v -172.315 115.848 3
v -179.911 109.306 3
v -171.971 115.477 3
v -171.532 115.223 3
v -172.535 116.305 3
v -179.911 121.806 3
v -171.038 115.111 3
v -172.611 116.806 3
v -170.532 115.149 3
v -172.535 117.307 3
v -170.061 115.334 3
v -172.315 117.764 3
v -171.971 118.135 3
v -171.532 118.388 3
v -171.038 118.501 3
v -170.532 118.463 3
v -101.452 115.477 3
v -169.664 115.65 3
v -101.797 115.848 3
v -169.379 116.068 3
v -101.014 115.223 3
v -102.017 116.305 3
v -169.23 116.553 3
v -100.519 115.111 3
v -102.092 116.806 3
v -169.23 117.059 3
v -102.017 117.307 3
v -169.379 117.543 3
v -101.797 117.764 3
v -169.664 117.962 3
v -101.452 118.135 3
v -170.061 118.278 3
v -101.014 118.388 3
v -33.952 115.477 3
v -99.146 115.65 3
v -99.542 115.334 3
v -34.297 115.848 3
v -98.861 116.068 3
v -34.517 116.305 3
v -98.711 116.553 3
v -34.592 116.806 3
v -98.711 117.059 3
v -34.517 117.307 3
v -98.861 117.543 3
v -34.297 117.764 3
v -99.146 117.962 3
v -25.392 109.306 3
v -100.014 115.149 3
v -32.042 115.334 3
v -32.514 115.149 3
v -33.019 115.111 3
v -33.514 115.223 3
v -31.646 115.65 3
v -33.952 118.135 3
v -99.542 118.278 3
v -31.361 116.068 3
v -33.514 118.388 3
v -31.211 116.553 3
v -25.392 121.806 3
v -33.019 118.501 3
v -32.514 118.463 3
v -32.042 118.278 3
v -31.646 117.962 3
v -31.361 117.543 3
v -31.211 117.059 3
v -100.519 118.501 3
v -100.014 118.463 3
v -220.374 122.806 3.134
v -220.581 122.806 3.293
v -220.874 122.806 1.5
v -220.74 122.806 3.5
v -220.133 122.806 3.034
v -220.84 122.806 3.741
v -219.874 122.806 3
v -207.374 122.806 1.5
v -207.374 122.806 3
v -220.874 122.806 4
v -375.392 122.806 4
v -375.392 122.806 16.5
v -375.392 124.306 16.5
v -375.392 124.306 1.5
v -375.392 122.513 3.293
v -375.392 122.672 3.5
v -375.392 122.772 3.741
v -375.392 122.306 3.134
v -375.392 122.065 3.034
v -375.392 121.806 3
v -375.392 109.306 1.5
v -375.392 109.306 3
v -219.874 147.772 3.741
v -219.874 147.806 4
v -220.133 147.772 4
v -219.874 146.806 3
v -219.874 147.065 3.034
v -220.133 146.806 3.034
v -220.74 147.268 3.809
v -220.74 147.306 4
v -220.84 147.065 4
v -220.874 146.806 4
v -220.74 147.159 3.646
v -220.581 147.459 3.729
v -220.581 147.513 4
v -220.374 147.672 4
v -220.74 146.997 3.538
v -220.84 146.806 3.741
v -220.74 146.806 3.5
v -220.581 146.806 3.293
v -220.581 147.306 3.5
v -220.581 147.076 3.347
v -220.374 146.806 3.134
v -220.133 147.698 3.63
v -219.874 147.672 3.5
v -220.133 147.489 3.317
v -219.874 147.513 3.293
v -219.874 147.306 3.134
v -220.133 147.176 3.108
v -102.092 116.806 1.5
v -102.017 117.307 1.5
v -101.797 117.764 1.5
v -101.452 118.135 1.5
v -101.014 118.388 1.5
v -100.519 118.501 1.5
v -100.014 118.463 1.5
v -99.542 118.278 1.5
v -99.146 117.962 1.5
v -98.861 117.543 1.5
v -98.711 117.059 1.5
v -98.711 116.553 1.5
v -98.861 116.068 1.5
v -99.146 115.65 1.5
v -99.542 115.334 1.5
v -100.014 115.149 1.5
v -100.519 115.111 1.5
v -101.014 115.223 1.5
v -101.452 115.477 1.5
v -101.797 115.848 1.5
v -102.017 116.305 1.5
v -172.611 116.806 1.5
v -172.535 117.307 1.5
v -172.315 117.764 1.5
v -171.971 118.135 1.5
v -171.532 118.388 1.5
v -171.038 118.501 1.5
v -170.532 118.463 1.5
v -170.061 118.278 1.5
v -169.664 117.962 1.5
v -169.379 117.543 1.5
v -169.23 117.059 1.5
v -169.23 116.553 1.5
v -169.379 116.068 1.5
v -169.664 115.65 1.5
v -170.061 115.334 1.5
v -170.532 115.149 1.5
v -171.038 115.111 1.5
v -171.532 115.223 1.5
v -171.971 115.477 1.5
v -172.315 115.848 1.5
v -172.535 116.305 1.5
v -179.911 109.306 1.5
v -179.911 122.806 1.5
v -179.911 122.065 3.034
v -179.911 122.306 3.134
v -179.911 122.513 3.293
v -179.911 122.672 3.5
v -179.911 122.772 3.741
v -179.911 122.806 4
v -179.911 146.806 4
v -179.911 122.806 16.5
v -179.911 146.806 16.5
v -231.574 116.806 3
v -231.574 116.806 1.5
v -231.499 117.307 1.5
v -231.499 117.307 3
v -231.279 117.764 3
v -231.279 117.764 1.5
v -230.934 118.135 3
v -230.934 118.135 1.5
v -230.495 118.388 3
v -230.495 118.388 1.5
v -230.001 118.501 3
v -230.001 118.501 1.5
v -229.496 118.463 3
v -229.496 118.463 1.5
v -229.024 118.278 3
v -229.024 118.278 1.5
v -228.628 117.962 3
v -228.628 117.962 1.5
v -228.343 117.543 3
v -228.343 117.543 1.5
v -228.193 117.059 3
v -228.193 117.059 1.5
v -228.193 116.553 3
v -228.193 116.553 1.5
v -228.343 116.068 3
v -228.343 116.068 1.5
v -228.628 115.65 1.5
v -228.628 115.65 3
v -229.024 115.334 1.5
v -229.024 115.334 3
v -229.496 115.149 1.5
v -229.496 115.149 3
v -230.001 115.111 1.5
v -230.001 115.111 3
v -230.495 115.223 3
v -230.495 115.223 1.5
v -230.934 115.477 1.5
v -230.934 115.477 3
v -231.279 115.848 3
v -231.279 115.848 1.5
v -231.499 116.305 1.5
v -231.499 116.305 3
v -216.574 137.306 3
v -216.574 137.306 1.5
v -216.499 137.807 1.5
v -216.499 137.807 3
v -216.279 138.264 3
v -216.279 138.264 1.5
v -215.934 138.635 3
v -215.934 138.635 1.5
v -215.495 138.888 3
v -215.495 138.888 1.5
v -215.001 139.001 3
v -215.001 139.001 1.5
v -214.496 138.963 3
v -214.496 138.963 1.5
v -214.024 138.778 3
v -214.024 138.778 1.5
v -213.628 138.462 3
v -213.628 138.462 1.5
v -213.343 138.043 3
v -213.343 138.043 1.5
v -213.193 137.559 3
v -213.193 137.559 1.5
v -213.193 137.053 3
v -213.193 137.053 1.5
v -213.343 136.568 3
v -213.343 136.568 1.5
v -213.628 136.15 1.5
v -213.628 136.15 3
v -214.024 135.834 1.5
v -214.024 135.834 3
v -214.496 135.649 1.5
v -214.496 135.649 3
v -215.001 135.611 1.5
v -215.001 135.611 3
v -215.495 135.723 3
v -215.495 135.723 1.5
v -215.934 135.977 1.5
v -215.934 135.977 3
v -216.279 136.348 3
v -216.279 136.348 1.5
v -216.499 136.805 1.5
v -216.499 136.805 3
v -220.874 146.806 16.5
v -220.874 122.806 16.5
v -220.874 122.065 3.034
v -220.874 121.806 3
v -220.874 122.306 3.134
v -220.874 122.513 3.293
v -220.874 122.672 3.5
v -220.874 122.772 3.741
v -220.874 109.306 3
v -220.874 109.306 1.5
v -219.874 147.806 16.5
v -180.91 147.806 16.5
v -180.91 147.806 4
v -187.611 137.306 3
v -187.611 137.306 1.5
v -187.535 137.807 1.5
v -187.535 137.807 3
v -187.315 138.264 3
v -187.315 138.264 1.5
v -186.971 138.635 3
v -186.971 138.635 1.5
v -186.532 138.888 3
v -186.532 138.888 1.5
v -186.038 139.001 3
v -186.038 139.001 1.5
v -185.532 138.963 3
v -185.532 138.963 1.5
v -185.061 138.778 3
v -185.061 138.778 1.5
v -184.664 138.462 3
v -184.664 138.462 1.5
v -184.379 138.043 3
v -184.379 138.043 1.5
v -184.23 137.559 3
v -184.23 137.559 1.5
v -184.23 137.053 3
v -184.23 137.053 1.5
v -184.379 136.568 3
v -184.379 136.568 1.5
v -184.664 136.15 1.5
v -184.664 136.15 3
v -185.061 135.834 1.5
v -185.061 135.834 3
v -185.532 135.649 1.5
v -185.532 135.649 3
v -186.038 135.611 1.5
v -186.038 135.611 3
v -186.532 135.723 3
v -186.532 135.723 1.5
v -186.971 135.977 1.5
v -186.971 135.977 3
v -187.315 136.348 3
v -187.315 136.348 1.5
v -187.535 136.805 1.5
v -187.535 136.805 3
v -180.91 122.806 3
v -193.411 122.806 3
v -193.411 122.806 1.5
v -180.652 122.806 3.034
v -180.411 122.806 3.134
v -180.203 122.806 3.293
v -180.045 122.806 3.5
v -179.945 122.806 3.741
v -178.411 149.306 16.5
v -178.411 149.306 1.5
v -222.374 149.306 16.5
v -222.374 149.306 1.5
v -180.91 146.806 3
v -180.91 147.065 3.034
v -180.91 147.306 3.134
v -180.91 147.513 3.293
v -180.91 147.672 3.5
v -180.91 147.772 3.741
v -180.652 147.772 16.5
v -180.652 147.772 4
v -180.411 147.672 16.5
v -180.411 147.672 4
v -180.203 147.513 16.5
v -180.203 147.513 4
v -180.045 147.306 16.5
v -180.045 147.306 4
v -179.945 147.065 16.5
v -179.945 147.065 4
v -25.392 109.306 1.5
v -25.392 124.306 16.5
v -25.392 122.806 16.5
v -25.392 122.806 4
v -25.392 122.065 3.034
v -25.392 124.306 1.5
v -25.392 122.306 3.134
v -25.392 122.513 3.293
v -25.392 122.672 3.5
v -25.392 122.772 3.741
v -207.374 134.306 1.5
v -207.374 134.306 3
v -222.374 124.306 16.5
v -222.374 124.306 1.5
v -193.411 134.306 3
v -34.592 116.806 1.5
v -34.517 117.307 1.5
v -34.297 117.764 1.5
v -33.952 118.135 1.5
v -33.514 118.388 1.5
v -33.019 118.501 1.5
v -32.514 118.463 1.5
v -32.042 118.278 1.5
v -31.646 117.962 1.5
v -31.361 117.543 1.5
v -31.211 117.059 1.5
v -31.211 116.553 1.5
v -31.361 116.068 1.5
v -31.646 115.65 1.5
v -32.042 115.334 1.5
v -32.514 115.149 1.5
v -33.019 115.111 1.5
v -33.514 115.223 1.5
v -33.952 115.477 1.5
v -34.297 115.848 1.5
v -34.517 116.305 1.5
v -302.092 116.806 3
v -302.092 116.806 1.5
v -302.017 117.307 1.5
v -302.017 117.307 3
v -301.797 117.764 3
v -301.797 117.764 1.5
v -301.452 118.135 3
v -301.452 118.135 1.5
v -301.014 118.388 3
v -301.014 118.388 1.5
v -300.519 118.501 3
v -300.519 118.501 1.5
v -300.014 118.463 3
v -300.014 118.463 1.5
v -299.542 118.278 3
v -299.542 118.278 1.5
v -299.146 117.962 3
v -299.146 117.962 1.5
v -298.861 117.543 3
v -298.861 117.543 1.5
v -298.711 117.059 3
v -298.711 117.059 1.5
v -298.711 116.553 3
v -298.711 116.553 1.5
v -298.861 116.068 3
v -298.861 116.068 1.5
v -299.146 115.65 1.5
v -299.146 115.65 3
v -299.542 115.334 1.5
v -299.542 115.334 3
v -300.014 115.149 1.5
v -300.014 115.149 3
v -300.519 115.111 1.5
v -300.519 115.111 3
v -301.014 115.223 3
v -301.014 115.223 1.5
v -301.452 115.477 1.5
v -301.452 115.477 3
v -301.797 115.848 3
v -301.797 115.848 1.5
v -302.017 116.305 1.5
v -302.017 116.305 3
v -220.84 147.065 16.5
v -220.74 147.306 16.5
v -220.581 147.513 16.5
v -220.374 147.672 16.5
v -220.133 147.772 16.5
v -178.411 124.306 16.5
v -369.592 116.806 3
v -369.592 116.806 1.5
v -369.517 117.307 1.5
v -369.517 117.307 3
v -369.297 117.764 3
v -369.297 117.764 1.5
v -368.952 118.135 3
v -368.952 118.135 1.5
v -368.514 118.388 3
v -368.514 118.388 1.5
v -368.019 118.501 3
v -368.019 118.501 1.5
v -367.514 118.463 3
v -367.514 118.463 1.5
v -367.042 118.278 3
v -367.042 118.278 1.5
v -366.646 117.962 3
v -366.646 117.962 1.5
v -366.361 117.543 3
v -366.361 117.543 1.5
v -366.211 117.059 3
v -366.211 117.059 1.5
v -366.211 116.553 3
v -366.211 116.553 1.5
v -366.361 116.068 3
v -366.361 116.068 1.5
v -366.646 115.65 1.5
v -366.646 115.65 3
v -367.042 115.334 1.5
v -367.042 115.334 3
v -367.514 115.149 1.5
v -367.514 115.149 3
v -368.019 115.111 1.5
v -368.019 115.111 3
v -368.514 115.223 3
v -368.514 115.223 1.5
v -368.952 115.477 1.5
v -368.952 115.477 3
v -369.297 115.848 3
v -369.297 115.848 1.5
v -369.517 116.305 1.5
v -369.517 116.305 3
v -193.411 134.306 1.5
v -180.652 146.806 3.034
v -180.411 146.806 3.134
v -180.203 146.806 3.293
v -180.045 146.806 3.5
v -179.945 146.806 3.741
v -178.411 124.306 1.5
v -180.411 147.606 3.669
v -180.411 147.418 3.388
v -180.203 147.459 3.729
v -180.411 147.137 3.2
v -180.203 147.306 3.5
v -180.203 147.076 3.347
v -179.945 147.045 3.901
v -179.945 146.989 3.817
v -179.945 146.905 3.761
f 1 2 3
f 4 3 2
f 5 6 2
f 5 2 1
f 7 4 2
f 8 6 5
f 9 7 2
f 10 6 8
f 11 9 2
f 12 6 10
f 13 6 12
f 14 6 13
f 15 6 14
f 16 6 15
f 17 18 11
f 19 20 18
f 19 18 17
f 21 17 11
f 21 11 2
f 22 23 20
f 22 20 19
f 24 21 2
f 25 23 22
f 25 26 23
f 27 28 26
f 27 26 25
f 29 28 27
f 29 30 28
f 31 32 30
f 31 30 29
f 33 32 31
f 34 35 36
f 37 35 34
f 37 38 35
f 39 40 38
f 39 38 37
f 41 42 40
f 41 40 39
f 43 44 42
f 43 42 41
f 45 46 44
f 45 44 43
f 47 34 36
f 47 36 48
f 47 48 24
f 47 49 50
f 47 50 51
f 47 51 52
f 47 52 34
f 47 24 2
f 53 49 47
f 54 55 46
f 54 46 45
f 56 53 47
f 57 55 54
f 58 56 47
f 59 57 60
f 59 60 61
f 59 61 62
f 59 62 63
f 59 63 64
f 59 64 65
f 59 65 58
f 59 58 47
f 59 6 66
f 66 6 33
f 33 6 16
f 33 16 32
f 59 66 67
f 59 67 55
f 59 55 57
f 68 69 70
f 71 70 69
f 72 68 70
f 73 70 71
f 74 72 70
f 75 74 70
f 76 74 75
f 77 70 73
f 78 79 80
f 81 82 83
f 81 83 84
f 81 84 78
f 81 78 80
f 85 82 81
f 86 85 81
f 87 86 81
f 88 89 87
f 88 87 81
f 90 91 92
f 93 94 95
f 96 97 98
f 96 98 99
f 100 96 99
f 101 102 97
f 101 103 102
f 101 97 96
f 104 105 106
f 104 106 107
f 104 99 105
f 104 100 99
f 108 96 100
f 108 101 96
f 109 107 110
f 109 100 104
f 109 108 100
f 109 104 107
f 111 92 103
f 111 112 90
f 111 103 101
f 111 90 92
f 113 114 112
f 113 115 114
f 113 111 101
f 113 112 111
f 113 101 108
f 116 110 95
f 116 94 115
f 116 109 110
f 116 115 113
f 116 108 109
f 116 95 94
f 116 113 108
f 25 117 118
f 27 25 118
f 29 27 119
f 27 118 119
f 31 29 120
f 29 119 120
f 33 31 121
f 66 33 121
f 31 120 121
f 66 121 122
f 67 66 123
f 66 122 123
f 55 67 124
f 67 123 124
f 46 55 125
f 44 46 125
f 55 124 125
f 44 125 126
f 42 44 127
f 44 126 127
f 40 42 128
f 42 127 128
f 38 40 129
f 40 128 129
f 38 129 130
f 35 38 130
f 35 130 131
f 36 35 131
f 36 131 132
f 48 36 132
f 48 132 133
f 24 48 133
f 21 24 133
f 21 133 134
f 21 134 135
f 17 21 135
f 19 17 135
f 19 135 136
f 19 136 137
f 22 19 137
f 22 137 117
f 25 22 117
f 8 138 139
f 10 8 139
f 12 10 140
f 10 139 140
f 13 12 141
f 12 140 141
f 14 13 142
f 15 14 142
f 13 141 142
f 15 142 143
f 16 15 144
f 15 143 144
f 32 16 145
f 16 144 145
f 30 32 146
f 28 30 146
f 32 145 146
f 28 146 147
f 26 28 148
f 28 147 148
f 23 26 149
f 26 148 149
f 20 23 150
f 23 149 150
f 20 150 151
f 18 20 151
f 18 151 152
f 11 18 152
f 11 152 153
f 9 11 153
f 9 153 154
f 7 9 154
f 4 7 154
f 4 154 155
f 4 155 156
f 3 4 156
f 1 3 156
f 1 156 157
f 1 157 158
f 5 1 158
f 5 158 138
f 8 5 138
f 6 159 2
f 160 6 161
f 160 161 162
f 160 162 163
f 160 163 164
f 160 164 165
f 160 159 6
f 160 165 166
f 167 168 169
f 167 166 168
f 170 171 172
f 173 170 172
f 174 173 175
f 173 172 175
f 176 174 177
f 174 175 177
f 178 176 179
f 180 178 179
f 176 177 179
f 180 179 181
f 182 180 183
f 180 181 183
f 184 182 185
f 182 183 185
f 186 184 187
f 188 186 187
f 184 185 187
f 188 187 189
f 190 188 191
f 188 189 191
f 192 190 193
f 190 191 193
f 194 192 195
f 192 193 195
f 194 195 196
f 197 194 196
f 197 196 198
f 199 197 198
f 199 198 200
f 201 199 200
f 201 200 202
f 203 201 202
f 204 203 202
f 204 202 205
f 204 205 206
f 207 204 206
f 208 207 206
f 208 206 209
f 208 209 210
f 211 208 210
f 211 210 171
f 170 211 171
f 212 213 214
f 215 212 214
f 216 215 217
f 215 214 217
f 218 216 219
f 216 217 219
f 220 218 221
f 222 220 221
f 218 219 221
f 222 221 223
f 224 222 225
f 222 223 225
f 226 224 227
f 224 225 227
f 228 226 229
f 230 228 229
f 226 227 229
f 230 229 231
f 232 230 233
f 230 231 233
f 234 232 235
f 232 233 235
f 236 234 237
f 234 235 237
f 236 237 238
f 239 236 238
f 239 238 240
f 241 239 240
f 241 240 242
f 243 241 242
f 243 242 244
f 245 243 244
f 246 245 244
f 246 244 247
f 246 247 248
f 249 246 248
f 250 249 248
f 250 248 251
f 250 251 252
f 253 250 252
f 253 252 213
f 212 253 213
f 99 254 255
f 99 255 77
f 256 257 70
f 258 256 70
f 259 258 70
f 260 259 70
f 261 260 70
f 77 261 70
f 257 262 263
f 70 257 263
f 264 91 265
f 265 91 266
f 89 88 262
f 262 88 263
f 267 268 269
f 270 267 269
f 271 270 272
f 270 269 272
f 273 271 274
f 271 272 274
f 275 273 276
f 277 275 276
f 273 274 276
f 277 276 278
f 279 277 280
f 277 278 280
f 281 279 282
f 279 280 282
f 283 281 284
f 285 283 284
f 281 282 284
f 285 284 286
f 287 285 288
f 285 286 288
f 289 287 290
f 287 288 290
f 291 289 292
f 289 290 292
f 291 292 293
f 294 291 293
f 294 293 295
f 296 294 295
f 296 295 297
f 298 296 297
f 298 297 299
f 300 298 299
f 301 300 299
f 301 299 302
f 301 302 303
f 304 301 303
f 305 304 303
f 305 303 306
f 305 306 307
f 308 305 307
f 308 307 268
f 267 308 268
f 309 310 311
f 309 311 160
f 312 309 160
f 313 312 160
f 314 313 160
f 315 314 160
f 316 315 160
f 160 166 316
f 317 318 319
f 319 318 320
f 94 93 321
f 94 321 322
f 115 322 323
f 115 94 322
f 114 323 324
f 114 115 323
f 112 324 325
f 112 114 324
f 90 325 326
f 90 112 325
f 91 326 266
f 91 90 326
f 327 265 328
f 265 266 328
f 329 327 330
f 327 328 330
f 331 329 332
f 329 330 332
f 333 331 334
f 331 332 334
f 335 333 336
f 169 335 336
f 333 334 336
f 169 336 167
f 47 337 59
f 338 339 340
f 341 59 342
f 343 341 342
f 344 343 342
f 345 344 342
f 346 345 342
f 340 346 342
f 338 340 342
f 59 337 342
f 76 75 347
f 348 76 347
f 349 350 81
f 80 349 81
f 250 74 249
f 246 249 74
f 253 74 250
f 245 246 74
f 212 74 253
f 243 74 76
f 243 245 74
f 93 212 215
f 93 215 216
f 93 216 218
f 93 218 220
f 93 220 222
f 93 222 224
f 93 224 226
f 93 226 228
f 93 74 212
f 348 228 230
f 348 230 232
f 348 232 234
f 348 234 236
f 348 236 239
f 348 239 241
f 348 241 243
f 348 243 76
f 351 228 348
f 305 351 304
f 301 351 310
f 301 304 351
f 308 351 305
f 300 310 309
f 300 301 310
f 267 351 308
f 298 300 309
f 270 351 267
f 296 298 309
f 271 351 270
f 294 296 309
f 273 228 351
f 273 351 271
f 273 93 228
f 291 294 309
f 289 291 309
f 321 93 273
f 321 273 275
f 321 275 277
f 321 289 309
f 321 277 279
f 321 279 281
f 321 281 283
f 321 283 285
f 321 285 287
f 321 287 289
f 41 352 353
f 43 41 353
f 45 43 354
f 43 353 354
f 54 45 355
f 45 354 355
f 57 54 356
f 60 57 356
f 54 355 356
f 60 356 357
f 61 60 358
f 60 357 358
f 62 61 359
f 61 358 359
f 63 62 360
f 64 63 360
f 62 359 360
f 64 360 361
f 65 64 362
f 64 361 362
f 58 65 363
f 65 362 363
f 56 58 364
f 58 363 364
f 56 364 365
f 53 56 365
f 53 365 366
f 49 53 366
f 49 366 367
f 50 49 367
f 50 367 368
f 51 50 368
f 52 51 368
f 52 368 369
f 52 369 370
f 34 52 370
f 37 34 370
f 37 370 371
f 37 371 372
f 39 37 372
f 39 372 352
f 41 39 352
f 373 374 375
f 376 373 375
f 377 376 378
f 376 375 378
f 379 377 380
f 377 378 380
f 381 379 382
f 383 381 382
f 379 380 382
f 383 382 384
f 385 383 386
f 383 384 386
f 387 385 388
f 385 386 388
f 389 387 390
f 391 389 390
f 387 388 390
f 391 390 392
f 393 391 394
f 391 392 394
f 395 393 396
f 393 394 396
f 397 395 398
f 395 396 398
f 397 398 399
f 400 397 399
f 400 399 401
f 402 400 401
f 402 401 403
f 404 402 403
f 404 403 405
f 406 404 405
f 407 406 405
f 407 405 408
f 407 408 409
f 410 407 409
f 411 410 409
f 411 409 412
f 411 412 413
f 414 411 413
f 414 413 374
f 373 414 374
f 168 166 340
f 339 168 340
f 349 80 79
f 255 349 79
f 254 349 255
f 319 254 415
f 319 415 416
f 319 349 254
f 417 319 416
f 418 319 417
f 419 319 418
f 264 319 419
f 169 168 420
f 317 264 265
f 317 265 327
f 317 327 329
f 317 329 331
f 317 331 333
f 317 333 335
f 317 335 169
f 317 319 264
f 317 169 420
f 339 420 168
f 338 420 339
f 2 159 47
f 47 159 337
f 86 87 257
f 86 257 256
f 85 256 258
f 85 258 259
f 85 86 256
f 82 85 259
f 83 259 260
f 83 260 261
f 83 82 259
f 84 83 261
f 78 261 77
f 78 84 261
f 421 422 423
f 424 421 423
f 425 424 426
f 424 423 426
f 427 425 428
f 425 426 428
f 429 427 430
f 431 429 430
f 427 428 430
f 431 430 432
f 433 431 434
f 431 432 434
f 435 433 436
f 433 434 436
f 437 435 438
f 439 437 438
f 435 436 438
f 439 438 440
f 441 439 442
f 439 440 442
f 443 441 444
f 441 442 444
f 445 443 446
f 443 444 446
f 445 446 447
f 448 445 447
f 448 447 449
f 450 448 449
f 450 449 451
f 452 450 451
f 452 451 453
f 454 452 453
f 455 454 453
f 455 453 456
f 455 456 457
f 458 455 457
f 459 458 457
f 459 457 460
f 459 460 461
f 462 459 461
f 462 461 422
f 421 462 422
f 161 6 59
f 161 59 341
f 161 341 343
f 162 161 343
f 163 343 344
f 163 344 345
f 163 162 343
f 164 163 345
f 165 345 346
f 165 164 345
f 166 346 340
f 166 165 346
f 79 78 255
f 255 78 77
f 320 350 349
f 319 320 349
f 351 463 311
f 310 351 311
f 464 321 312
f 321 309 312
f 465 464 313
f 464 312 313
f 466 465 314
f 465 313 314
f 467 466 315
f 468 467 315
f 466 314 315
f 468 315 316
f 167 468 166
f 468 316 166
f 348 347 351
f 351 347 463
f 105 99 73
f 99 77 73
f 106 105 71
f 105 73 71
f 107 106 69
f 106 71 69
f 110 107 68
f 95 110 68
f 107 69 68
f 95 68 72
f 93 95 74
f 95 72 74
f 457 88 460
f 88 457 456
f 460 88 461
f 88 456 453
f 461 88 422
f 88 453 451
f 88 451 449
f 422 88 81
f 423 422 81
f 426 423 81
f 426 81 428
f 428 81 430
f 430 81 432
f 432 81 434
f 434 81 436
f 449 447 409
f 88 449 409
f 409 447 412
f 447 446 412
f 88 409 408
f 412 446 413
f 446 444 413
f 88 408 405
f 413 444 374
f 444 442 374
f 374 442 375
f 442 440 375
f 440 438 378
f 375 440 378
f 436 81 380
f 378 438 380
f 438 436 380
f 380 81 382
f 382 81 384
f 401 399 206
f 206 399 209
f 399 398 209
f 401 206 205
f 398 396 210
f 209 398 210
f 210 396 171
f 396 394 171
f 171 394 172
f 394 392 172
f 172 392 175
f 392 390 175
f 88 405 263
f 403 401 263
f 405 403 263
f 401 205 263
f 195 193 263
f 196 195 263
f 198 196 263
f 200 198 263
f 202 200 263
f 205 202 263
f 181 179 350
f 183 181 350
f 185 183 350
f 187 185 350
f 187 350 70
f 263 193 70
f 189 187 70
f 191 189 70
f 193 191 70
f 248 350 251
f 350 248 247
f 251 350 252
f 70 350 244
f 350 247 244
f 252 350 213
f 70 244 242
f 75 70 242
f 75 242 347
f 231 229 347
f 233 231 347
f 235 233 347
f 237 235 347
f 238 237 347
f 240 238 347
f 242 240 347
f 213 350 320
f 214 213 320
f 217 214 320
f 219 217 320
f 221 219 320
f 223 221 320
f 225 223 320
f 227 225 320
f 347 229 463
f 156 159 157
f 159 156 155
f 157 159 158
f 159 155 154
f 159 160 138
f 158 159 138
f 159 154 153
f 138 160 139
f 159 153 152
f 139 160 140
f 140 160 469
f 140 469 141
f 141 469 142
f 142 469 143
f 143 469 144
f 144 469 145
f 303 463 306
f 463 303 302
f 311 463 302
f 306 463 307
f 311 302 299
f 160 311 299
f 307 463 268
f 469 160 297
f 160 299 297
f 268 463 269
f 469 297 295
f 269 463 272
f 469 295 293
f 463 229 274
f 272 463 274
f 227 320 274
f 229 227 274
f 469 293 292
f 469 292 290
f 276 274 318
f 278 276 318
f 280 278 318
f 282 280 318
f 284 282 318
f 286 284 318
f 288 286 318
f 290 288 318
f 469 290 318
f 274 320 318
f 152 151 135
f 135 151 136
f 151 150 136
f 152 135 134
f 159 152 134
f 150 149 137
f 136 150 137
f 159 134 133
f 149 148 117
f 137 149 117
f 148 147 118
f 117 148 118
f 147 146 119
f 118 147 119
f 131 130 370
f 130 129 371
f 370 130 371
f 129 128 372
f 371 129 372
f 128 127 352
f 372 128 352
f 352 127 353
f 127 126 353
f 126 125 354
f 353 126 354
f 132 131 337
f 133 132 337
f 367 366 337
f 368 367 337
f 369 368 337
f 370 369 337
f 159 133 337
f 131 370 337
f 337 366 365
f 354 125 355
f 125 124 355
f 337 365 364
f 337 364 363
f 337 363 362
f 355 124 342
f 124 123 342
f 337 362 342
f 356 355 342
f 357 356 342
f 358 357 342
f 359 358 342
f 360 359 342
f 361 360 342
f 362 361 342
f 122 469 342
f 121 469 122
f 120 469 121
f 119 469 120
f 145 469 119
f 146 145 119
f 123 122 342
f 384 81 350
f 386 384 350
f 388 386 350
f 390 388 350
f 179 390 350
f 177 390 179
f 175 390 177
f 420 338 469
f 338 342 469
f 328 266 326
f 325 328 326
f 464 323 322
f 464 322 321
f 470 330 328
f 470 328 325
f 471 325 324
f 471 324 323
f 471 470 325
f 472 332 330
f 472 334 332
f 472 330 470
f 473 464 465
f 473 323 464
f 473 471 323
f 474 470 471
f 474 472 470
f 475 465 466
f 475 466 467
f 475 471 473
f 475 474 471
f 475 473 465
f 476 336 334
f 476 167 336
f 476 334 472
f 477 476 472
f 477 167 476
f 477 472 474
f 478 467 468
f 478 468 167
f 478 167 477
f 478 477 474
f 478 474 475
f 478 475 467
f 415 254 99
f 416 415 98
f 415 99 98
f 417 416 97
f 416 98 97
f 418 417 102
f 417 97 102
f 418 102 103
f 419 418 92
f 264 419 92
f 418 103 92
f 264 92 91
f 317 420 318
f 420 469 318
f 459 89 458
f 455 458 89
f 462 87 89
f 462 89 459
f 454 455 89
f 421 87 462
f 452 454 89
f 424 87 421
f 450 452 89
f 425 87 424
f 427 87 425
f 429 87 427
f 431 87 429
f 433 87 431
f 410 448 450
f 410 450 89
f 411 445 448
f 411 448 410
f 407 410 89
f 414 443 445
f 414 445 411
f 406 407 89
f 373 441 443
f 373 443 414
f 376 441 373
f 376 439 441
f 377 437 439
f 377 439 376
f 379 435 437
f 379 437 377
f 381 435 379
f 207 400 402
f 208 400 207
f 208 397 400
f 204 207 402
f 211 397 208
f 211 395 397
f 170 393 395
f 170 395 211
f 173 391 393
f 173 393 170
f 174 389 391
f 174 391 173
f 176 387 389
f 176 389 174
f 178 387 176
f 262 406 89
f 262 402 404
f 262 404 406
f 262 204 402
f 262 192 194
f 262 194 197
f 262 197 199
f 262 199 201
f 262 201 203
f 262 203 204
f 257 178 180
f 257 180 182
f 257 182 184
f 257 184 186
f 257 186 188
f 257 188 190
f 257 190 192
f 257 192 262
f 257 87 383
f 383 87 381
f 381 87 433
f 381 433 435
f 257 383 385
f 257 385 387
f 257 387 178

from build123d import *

# Parameters (mm, degrees)
BOSS_EXTRU_1_DEPTH      = 1.5
BOSS_EXTRU_2_DEPTH      = 13.5
D_GAGEMENT_M32_D        = 3.4
D_GAGEMENT_M32_DEPTH    = 10
D_GAGEMENT_M32_TIP      = 1.021463052
D_GAGEMENT_M31_D        = 3.4
D_GAGEMENT_M31_DEPTH    = 10
D_GAGEMENT_M31_TIP      = 1.021463052
ESQUISSE12_W            = 13.5
ESQUISSE12_H            = 13.5
ENL_V_MAT_EXTRU_1_DEPTH = 1.5
CONG_1_R                = 1
CONG_2_R                = 1


# Some blends are built 0.0001 mm under size
with BuildPart() as part:
    # Esquisse2 → Boss.-Extru.1 (new body)
    with BuildSketch(Plane.XY.offset(1.5)):
        Polygon((-25.392437762, 124.305889048), (-178.410591433, 124.305889048), (-178.410591433, 149.305889048), (-222.374284091, 149.305889048), (-222.374284091, 124.305889048), (-375.392437762, 124.305889048), (-375.392437762, 109.305889048), (-207.374284091, 109.305889048), (-207.374284091, 134.305889048), (-193.410591433, 134.305889048), (-193.410591433, 109.305889048), (-25.392437762, 109.305889048), align=None)
    extrude(amount=BOSS_EXTRU_1_DEPTH)

    # Esquisse3 → Boss.-Extru.2 (add)
    with BuildSketch(Plane.XY.offset(3)):
        Polygon((-375.392437762, 122.805889048), (-220.874284091, 122.805889048), (-220.874284091, 147.805889048), (-179.910591433, 147.805889048), (-179.910591433, 122.805889048), (-25.392437762, 122.805889048), (-25.392437762, 124.305889048), (-178.410591433, 124.305889048), (-178.410591433, 149.305889048), (-222.374284091, 149.305889048), (-222.374284091, 124.305889048), (-375.392437762, 124.305889048), align=None)
    extrude(amount=BOSS_EXTRU_2_DEPTH)

    # Dégagement M32
    with Locations(Plane(origin=(-229.874284091, 116.805889048, 3), x_dir=(1, 0, 0), z_dir=(0, 0, 1))):
        with Locations((0, 0), (-70.518153671, 0), (-138.018153671, 0), (58.963692658, 0), (129.481846329, 0), (196.981846329, 0)):
            Hole(D_GAGEMENT_M32_D / 2, depth=D_GAGEMENT_M32_DEPTH)
            with Locations((0, 0, -(D_GAGEMENT_M32_DEPTH + D_GAGEMENT_M32_TIP / 2))):  # 118° drill point
                Cone(0, D_GAGEMENT_M32_D / 2, D_GAGEMENT_M32_TIP, mode=Mode.SUBTRACT)

    # Dégagement M31
    with Locations(Plane(origin=(-214.874284091, 137.305889048, 3), x_dir=(1, 0, 0), z_dir=(0, 0, 1))):
        with Locations((0, 0), (28.963692658, 0)):
            Hole(D_GAGEMENT_M31_D / 2, depth=D_GAGEMENT_M31_DEPTH)
            with Locations((0, 0, -(D_GAGEMENT_M31_DEPTH + D_GAGEMENT_M31_TIP / 2))):  # 118° drill point
                Cone(0, D_GAGEMENT_M31_D / 2, D_GAGEMENT_M31_TIP, mode=Mode.SUBTRACT)

    # Esquisse12 → Enlèv. mat.-Extru.1 (cut)
    with BuildSketch(Plane.XY.offset(3)):
        with Locations((-214.124284091, 116.055889048)):
            Rectangle(ESQUISSE12_W, ESQUISSE12_H)
        with Locations((-186.660591433, 116.055889048)):
            Rectangle(ESQUISSE12_W, ESQUISSE12_H)
    extrude(amount=-ENL_V_MAT_EXTRU_1_DEPTH, mode=Mode.SUBTRACT)

    # Congé1
    # the kernel refuses this fillet: 1 mm, written as the material it adds along each edge
    with BuildSketch(Plane(origin=(-179.910591433, 122.805889048, 3), x_dir=(0, -1, 0), z_dir=(1, 0, 0))) as cong_1_piece_1:
        with BuildLine():
            CenterArc((CONG_1_R, -CONG_1_R), CONG_1_R, 90, 90)
            Line((0, -CONG_1_R), (0, 0))
            Line((0, 0), (CONG_1_R, 0))
        make_face()
    extrude(amount=154.518153671)
    with BuildSketch(Plane(origin=(-223.374284091, 147.805889048, 3), x_dir=(0, 0, 1), z_dir=(1, 0, 0))) as cong_1_piece_2_section:
        with BuildLine():
            CenterArc((CONG_1_R, CONG_1_R), CONG_1_R, 180, 90)
            Line((0, CONG_1_R), (0, 0))
            Line((0, 0), (CONG_1_R, 0))
        make_face()
    cong_1_piece_2 = extrude(amount=43.463692658, mode=Mode.PRIVATE)
    cong_1_piece_2 = split(cong_1_piece_2, bisect_by=Plane(origin=(-222.374284091, 147.582521109, 3.223367939), z_dir=(1, 0, 0)), keep=Keep.TOP, mode=Mode.PRIVATE)
    add(cong_1_piece_2)
    with BuildSketch(Plane(origin=(-375.392437762, 122.805889048, 3), x_dir=(0, 0, 1), z_dir=(1, 0, 0))) as cong_1_piece_3:
        with BuildLine():
            CenterArc((CONG_1_R, CONG_1_R), CONG_1_R, 180, 90)
            Line((0, CONG_1_R), (0, 0))
            Line((0, 0), (CONG_1_R, 0))
        make_face()
    extrude(amount=154.518153671)

    # Congé2
    cong_2_edges = [part.edges().sort_by_distance(p)[0] for p in [
        (-179.910591433, 134.805889048, 3),
        (-179.910591433, 147.512995829, 3.292893219),
        (-220.874284091, 147.512995829, 3.292893219),
        (-220.874284091, 134.805889048, 3),
        (-220.874284091, 147.805889048, 10.25),
        (-179.910591433, 147.805889048, 10.25),
    ]]
    fillet(cong_2_edges, radius=CONG_2_R - 0.0001)  # a hair under: the kernel refuses the full size


solid = part.part
